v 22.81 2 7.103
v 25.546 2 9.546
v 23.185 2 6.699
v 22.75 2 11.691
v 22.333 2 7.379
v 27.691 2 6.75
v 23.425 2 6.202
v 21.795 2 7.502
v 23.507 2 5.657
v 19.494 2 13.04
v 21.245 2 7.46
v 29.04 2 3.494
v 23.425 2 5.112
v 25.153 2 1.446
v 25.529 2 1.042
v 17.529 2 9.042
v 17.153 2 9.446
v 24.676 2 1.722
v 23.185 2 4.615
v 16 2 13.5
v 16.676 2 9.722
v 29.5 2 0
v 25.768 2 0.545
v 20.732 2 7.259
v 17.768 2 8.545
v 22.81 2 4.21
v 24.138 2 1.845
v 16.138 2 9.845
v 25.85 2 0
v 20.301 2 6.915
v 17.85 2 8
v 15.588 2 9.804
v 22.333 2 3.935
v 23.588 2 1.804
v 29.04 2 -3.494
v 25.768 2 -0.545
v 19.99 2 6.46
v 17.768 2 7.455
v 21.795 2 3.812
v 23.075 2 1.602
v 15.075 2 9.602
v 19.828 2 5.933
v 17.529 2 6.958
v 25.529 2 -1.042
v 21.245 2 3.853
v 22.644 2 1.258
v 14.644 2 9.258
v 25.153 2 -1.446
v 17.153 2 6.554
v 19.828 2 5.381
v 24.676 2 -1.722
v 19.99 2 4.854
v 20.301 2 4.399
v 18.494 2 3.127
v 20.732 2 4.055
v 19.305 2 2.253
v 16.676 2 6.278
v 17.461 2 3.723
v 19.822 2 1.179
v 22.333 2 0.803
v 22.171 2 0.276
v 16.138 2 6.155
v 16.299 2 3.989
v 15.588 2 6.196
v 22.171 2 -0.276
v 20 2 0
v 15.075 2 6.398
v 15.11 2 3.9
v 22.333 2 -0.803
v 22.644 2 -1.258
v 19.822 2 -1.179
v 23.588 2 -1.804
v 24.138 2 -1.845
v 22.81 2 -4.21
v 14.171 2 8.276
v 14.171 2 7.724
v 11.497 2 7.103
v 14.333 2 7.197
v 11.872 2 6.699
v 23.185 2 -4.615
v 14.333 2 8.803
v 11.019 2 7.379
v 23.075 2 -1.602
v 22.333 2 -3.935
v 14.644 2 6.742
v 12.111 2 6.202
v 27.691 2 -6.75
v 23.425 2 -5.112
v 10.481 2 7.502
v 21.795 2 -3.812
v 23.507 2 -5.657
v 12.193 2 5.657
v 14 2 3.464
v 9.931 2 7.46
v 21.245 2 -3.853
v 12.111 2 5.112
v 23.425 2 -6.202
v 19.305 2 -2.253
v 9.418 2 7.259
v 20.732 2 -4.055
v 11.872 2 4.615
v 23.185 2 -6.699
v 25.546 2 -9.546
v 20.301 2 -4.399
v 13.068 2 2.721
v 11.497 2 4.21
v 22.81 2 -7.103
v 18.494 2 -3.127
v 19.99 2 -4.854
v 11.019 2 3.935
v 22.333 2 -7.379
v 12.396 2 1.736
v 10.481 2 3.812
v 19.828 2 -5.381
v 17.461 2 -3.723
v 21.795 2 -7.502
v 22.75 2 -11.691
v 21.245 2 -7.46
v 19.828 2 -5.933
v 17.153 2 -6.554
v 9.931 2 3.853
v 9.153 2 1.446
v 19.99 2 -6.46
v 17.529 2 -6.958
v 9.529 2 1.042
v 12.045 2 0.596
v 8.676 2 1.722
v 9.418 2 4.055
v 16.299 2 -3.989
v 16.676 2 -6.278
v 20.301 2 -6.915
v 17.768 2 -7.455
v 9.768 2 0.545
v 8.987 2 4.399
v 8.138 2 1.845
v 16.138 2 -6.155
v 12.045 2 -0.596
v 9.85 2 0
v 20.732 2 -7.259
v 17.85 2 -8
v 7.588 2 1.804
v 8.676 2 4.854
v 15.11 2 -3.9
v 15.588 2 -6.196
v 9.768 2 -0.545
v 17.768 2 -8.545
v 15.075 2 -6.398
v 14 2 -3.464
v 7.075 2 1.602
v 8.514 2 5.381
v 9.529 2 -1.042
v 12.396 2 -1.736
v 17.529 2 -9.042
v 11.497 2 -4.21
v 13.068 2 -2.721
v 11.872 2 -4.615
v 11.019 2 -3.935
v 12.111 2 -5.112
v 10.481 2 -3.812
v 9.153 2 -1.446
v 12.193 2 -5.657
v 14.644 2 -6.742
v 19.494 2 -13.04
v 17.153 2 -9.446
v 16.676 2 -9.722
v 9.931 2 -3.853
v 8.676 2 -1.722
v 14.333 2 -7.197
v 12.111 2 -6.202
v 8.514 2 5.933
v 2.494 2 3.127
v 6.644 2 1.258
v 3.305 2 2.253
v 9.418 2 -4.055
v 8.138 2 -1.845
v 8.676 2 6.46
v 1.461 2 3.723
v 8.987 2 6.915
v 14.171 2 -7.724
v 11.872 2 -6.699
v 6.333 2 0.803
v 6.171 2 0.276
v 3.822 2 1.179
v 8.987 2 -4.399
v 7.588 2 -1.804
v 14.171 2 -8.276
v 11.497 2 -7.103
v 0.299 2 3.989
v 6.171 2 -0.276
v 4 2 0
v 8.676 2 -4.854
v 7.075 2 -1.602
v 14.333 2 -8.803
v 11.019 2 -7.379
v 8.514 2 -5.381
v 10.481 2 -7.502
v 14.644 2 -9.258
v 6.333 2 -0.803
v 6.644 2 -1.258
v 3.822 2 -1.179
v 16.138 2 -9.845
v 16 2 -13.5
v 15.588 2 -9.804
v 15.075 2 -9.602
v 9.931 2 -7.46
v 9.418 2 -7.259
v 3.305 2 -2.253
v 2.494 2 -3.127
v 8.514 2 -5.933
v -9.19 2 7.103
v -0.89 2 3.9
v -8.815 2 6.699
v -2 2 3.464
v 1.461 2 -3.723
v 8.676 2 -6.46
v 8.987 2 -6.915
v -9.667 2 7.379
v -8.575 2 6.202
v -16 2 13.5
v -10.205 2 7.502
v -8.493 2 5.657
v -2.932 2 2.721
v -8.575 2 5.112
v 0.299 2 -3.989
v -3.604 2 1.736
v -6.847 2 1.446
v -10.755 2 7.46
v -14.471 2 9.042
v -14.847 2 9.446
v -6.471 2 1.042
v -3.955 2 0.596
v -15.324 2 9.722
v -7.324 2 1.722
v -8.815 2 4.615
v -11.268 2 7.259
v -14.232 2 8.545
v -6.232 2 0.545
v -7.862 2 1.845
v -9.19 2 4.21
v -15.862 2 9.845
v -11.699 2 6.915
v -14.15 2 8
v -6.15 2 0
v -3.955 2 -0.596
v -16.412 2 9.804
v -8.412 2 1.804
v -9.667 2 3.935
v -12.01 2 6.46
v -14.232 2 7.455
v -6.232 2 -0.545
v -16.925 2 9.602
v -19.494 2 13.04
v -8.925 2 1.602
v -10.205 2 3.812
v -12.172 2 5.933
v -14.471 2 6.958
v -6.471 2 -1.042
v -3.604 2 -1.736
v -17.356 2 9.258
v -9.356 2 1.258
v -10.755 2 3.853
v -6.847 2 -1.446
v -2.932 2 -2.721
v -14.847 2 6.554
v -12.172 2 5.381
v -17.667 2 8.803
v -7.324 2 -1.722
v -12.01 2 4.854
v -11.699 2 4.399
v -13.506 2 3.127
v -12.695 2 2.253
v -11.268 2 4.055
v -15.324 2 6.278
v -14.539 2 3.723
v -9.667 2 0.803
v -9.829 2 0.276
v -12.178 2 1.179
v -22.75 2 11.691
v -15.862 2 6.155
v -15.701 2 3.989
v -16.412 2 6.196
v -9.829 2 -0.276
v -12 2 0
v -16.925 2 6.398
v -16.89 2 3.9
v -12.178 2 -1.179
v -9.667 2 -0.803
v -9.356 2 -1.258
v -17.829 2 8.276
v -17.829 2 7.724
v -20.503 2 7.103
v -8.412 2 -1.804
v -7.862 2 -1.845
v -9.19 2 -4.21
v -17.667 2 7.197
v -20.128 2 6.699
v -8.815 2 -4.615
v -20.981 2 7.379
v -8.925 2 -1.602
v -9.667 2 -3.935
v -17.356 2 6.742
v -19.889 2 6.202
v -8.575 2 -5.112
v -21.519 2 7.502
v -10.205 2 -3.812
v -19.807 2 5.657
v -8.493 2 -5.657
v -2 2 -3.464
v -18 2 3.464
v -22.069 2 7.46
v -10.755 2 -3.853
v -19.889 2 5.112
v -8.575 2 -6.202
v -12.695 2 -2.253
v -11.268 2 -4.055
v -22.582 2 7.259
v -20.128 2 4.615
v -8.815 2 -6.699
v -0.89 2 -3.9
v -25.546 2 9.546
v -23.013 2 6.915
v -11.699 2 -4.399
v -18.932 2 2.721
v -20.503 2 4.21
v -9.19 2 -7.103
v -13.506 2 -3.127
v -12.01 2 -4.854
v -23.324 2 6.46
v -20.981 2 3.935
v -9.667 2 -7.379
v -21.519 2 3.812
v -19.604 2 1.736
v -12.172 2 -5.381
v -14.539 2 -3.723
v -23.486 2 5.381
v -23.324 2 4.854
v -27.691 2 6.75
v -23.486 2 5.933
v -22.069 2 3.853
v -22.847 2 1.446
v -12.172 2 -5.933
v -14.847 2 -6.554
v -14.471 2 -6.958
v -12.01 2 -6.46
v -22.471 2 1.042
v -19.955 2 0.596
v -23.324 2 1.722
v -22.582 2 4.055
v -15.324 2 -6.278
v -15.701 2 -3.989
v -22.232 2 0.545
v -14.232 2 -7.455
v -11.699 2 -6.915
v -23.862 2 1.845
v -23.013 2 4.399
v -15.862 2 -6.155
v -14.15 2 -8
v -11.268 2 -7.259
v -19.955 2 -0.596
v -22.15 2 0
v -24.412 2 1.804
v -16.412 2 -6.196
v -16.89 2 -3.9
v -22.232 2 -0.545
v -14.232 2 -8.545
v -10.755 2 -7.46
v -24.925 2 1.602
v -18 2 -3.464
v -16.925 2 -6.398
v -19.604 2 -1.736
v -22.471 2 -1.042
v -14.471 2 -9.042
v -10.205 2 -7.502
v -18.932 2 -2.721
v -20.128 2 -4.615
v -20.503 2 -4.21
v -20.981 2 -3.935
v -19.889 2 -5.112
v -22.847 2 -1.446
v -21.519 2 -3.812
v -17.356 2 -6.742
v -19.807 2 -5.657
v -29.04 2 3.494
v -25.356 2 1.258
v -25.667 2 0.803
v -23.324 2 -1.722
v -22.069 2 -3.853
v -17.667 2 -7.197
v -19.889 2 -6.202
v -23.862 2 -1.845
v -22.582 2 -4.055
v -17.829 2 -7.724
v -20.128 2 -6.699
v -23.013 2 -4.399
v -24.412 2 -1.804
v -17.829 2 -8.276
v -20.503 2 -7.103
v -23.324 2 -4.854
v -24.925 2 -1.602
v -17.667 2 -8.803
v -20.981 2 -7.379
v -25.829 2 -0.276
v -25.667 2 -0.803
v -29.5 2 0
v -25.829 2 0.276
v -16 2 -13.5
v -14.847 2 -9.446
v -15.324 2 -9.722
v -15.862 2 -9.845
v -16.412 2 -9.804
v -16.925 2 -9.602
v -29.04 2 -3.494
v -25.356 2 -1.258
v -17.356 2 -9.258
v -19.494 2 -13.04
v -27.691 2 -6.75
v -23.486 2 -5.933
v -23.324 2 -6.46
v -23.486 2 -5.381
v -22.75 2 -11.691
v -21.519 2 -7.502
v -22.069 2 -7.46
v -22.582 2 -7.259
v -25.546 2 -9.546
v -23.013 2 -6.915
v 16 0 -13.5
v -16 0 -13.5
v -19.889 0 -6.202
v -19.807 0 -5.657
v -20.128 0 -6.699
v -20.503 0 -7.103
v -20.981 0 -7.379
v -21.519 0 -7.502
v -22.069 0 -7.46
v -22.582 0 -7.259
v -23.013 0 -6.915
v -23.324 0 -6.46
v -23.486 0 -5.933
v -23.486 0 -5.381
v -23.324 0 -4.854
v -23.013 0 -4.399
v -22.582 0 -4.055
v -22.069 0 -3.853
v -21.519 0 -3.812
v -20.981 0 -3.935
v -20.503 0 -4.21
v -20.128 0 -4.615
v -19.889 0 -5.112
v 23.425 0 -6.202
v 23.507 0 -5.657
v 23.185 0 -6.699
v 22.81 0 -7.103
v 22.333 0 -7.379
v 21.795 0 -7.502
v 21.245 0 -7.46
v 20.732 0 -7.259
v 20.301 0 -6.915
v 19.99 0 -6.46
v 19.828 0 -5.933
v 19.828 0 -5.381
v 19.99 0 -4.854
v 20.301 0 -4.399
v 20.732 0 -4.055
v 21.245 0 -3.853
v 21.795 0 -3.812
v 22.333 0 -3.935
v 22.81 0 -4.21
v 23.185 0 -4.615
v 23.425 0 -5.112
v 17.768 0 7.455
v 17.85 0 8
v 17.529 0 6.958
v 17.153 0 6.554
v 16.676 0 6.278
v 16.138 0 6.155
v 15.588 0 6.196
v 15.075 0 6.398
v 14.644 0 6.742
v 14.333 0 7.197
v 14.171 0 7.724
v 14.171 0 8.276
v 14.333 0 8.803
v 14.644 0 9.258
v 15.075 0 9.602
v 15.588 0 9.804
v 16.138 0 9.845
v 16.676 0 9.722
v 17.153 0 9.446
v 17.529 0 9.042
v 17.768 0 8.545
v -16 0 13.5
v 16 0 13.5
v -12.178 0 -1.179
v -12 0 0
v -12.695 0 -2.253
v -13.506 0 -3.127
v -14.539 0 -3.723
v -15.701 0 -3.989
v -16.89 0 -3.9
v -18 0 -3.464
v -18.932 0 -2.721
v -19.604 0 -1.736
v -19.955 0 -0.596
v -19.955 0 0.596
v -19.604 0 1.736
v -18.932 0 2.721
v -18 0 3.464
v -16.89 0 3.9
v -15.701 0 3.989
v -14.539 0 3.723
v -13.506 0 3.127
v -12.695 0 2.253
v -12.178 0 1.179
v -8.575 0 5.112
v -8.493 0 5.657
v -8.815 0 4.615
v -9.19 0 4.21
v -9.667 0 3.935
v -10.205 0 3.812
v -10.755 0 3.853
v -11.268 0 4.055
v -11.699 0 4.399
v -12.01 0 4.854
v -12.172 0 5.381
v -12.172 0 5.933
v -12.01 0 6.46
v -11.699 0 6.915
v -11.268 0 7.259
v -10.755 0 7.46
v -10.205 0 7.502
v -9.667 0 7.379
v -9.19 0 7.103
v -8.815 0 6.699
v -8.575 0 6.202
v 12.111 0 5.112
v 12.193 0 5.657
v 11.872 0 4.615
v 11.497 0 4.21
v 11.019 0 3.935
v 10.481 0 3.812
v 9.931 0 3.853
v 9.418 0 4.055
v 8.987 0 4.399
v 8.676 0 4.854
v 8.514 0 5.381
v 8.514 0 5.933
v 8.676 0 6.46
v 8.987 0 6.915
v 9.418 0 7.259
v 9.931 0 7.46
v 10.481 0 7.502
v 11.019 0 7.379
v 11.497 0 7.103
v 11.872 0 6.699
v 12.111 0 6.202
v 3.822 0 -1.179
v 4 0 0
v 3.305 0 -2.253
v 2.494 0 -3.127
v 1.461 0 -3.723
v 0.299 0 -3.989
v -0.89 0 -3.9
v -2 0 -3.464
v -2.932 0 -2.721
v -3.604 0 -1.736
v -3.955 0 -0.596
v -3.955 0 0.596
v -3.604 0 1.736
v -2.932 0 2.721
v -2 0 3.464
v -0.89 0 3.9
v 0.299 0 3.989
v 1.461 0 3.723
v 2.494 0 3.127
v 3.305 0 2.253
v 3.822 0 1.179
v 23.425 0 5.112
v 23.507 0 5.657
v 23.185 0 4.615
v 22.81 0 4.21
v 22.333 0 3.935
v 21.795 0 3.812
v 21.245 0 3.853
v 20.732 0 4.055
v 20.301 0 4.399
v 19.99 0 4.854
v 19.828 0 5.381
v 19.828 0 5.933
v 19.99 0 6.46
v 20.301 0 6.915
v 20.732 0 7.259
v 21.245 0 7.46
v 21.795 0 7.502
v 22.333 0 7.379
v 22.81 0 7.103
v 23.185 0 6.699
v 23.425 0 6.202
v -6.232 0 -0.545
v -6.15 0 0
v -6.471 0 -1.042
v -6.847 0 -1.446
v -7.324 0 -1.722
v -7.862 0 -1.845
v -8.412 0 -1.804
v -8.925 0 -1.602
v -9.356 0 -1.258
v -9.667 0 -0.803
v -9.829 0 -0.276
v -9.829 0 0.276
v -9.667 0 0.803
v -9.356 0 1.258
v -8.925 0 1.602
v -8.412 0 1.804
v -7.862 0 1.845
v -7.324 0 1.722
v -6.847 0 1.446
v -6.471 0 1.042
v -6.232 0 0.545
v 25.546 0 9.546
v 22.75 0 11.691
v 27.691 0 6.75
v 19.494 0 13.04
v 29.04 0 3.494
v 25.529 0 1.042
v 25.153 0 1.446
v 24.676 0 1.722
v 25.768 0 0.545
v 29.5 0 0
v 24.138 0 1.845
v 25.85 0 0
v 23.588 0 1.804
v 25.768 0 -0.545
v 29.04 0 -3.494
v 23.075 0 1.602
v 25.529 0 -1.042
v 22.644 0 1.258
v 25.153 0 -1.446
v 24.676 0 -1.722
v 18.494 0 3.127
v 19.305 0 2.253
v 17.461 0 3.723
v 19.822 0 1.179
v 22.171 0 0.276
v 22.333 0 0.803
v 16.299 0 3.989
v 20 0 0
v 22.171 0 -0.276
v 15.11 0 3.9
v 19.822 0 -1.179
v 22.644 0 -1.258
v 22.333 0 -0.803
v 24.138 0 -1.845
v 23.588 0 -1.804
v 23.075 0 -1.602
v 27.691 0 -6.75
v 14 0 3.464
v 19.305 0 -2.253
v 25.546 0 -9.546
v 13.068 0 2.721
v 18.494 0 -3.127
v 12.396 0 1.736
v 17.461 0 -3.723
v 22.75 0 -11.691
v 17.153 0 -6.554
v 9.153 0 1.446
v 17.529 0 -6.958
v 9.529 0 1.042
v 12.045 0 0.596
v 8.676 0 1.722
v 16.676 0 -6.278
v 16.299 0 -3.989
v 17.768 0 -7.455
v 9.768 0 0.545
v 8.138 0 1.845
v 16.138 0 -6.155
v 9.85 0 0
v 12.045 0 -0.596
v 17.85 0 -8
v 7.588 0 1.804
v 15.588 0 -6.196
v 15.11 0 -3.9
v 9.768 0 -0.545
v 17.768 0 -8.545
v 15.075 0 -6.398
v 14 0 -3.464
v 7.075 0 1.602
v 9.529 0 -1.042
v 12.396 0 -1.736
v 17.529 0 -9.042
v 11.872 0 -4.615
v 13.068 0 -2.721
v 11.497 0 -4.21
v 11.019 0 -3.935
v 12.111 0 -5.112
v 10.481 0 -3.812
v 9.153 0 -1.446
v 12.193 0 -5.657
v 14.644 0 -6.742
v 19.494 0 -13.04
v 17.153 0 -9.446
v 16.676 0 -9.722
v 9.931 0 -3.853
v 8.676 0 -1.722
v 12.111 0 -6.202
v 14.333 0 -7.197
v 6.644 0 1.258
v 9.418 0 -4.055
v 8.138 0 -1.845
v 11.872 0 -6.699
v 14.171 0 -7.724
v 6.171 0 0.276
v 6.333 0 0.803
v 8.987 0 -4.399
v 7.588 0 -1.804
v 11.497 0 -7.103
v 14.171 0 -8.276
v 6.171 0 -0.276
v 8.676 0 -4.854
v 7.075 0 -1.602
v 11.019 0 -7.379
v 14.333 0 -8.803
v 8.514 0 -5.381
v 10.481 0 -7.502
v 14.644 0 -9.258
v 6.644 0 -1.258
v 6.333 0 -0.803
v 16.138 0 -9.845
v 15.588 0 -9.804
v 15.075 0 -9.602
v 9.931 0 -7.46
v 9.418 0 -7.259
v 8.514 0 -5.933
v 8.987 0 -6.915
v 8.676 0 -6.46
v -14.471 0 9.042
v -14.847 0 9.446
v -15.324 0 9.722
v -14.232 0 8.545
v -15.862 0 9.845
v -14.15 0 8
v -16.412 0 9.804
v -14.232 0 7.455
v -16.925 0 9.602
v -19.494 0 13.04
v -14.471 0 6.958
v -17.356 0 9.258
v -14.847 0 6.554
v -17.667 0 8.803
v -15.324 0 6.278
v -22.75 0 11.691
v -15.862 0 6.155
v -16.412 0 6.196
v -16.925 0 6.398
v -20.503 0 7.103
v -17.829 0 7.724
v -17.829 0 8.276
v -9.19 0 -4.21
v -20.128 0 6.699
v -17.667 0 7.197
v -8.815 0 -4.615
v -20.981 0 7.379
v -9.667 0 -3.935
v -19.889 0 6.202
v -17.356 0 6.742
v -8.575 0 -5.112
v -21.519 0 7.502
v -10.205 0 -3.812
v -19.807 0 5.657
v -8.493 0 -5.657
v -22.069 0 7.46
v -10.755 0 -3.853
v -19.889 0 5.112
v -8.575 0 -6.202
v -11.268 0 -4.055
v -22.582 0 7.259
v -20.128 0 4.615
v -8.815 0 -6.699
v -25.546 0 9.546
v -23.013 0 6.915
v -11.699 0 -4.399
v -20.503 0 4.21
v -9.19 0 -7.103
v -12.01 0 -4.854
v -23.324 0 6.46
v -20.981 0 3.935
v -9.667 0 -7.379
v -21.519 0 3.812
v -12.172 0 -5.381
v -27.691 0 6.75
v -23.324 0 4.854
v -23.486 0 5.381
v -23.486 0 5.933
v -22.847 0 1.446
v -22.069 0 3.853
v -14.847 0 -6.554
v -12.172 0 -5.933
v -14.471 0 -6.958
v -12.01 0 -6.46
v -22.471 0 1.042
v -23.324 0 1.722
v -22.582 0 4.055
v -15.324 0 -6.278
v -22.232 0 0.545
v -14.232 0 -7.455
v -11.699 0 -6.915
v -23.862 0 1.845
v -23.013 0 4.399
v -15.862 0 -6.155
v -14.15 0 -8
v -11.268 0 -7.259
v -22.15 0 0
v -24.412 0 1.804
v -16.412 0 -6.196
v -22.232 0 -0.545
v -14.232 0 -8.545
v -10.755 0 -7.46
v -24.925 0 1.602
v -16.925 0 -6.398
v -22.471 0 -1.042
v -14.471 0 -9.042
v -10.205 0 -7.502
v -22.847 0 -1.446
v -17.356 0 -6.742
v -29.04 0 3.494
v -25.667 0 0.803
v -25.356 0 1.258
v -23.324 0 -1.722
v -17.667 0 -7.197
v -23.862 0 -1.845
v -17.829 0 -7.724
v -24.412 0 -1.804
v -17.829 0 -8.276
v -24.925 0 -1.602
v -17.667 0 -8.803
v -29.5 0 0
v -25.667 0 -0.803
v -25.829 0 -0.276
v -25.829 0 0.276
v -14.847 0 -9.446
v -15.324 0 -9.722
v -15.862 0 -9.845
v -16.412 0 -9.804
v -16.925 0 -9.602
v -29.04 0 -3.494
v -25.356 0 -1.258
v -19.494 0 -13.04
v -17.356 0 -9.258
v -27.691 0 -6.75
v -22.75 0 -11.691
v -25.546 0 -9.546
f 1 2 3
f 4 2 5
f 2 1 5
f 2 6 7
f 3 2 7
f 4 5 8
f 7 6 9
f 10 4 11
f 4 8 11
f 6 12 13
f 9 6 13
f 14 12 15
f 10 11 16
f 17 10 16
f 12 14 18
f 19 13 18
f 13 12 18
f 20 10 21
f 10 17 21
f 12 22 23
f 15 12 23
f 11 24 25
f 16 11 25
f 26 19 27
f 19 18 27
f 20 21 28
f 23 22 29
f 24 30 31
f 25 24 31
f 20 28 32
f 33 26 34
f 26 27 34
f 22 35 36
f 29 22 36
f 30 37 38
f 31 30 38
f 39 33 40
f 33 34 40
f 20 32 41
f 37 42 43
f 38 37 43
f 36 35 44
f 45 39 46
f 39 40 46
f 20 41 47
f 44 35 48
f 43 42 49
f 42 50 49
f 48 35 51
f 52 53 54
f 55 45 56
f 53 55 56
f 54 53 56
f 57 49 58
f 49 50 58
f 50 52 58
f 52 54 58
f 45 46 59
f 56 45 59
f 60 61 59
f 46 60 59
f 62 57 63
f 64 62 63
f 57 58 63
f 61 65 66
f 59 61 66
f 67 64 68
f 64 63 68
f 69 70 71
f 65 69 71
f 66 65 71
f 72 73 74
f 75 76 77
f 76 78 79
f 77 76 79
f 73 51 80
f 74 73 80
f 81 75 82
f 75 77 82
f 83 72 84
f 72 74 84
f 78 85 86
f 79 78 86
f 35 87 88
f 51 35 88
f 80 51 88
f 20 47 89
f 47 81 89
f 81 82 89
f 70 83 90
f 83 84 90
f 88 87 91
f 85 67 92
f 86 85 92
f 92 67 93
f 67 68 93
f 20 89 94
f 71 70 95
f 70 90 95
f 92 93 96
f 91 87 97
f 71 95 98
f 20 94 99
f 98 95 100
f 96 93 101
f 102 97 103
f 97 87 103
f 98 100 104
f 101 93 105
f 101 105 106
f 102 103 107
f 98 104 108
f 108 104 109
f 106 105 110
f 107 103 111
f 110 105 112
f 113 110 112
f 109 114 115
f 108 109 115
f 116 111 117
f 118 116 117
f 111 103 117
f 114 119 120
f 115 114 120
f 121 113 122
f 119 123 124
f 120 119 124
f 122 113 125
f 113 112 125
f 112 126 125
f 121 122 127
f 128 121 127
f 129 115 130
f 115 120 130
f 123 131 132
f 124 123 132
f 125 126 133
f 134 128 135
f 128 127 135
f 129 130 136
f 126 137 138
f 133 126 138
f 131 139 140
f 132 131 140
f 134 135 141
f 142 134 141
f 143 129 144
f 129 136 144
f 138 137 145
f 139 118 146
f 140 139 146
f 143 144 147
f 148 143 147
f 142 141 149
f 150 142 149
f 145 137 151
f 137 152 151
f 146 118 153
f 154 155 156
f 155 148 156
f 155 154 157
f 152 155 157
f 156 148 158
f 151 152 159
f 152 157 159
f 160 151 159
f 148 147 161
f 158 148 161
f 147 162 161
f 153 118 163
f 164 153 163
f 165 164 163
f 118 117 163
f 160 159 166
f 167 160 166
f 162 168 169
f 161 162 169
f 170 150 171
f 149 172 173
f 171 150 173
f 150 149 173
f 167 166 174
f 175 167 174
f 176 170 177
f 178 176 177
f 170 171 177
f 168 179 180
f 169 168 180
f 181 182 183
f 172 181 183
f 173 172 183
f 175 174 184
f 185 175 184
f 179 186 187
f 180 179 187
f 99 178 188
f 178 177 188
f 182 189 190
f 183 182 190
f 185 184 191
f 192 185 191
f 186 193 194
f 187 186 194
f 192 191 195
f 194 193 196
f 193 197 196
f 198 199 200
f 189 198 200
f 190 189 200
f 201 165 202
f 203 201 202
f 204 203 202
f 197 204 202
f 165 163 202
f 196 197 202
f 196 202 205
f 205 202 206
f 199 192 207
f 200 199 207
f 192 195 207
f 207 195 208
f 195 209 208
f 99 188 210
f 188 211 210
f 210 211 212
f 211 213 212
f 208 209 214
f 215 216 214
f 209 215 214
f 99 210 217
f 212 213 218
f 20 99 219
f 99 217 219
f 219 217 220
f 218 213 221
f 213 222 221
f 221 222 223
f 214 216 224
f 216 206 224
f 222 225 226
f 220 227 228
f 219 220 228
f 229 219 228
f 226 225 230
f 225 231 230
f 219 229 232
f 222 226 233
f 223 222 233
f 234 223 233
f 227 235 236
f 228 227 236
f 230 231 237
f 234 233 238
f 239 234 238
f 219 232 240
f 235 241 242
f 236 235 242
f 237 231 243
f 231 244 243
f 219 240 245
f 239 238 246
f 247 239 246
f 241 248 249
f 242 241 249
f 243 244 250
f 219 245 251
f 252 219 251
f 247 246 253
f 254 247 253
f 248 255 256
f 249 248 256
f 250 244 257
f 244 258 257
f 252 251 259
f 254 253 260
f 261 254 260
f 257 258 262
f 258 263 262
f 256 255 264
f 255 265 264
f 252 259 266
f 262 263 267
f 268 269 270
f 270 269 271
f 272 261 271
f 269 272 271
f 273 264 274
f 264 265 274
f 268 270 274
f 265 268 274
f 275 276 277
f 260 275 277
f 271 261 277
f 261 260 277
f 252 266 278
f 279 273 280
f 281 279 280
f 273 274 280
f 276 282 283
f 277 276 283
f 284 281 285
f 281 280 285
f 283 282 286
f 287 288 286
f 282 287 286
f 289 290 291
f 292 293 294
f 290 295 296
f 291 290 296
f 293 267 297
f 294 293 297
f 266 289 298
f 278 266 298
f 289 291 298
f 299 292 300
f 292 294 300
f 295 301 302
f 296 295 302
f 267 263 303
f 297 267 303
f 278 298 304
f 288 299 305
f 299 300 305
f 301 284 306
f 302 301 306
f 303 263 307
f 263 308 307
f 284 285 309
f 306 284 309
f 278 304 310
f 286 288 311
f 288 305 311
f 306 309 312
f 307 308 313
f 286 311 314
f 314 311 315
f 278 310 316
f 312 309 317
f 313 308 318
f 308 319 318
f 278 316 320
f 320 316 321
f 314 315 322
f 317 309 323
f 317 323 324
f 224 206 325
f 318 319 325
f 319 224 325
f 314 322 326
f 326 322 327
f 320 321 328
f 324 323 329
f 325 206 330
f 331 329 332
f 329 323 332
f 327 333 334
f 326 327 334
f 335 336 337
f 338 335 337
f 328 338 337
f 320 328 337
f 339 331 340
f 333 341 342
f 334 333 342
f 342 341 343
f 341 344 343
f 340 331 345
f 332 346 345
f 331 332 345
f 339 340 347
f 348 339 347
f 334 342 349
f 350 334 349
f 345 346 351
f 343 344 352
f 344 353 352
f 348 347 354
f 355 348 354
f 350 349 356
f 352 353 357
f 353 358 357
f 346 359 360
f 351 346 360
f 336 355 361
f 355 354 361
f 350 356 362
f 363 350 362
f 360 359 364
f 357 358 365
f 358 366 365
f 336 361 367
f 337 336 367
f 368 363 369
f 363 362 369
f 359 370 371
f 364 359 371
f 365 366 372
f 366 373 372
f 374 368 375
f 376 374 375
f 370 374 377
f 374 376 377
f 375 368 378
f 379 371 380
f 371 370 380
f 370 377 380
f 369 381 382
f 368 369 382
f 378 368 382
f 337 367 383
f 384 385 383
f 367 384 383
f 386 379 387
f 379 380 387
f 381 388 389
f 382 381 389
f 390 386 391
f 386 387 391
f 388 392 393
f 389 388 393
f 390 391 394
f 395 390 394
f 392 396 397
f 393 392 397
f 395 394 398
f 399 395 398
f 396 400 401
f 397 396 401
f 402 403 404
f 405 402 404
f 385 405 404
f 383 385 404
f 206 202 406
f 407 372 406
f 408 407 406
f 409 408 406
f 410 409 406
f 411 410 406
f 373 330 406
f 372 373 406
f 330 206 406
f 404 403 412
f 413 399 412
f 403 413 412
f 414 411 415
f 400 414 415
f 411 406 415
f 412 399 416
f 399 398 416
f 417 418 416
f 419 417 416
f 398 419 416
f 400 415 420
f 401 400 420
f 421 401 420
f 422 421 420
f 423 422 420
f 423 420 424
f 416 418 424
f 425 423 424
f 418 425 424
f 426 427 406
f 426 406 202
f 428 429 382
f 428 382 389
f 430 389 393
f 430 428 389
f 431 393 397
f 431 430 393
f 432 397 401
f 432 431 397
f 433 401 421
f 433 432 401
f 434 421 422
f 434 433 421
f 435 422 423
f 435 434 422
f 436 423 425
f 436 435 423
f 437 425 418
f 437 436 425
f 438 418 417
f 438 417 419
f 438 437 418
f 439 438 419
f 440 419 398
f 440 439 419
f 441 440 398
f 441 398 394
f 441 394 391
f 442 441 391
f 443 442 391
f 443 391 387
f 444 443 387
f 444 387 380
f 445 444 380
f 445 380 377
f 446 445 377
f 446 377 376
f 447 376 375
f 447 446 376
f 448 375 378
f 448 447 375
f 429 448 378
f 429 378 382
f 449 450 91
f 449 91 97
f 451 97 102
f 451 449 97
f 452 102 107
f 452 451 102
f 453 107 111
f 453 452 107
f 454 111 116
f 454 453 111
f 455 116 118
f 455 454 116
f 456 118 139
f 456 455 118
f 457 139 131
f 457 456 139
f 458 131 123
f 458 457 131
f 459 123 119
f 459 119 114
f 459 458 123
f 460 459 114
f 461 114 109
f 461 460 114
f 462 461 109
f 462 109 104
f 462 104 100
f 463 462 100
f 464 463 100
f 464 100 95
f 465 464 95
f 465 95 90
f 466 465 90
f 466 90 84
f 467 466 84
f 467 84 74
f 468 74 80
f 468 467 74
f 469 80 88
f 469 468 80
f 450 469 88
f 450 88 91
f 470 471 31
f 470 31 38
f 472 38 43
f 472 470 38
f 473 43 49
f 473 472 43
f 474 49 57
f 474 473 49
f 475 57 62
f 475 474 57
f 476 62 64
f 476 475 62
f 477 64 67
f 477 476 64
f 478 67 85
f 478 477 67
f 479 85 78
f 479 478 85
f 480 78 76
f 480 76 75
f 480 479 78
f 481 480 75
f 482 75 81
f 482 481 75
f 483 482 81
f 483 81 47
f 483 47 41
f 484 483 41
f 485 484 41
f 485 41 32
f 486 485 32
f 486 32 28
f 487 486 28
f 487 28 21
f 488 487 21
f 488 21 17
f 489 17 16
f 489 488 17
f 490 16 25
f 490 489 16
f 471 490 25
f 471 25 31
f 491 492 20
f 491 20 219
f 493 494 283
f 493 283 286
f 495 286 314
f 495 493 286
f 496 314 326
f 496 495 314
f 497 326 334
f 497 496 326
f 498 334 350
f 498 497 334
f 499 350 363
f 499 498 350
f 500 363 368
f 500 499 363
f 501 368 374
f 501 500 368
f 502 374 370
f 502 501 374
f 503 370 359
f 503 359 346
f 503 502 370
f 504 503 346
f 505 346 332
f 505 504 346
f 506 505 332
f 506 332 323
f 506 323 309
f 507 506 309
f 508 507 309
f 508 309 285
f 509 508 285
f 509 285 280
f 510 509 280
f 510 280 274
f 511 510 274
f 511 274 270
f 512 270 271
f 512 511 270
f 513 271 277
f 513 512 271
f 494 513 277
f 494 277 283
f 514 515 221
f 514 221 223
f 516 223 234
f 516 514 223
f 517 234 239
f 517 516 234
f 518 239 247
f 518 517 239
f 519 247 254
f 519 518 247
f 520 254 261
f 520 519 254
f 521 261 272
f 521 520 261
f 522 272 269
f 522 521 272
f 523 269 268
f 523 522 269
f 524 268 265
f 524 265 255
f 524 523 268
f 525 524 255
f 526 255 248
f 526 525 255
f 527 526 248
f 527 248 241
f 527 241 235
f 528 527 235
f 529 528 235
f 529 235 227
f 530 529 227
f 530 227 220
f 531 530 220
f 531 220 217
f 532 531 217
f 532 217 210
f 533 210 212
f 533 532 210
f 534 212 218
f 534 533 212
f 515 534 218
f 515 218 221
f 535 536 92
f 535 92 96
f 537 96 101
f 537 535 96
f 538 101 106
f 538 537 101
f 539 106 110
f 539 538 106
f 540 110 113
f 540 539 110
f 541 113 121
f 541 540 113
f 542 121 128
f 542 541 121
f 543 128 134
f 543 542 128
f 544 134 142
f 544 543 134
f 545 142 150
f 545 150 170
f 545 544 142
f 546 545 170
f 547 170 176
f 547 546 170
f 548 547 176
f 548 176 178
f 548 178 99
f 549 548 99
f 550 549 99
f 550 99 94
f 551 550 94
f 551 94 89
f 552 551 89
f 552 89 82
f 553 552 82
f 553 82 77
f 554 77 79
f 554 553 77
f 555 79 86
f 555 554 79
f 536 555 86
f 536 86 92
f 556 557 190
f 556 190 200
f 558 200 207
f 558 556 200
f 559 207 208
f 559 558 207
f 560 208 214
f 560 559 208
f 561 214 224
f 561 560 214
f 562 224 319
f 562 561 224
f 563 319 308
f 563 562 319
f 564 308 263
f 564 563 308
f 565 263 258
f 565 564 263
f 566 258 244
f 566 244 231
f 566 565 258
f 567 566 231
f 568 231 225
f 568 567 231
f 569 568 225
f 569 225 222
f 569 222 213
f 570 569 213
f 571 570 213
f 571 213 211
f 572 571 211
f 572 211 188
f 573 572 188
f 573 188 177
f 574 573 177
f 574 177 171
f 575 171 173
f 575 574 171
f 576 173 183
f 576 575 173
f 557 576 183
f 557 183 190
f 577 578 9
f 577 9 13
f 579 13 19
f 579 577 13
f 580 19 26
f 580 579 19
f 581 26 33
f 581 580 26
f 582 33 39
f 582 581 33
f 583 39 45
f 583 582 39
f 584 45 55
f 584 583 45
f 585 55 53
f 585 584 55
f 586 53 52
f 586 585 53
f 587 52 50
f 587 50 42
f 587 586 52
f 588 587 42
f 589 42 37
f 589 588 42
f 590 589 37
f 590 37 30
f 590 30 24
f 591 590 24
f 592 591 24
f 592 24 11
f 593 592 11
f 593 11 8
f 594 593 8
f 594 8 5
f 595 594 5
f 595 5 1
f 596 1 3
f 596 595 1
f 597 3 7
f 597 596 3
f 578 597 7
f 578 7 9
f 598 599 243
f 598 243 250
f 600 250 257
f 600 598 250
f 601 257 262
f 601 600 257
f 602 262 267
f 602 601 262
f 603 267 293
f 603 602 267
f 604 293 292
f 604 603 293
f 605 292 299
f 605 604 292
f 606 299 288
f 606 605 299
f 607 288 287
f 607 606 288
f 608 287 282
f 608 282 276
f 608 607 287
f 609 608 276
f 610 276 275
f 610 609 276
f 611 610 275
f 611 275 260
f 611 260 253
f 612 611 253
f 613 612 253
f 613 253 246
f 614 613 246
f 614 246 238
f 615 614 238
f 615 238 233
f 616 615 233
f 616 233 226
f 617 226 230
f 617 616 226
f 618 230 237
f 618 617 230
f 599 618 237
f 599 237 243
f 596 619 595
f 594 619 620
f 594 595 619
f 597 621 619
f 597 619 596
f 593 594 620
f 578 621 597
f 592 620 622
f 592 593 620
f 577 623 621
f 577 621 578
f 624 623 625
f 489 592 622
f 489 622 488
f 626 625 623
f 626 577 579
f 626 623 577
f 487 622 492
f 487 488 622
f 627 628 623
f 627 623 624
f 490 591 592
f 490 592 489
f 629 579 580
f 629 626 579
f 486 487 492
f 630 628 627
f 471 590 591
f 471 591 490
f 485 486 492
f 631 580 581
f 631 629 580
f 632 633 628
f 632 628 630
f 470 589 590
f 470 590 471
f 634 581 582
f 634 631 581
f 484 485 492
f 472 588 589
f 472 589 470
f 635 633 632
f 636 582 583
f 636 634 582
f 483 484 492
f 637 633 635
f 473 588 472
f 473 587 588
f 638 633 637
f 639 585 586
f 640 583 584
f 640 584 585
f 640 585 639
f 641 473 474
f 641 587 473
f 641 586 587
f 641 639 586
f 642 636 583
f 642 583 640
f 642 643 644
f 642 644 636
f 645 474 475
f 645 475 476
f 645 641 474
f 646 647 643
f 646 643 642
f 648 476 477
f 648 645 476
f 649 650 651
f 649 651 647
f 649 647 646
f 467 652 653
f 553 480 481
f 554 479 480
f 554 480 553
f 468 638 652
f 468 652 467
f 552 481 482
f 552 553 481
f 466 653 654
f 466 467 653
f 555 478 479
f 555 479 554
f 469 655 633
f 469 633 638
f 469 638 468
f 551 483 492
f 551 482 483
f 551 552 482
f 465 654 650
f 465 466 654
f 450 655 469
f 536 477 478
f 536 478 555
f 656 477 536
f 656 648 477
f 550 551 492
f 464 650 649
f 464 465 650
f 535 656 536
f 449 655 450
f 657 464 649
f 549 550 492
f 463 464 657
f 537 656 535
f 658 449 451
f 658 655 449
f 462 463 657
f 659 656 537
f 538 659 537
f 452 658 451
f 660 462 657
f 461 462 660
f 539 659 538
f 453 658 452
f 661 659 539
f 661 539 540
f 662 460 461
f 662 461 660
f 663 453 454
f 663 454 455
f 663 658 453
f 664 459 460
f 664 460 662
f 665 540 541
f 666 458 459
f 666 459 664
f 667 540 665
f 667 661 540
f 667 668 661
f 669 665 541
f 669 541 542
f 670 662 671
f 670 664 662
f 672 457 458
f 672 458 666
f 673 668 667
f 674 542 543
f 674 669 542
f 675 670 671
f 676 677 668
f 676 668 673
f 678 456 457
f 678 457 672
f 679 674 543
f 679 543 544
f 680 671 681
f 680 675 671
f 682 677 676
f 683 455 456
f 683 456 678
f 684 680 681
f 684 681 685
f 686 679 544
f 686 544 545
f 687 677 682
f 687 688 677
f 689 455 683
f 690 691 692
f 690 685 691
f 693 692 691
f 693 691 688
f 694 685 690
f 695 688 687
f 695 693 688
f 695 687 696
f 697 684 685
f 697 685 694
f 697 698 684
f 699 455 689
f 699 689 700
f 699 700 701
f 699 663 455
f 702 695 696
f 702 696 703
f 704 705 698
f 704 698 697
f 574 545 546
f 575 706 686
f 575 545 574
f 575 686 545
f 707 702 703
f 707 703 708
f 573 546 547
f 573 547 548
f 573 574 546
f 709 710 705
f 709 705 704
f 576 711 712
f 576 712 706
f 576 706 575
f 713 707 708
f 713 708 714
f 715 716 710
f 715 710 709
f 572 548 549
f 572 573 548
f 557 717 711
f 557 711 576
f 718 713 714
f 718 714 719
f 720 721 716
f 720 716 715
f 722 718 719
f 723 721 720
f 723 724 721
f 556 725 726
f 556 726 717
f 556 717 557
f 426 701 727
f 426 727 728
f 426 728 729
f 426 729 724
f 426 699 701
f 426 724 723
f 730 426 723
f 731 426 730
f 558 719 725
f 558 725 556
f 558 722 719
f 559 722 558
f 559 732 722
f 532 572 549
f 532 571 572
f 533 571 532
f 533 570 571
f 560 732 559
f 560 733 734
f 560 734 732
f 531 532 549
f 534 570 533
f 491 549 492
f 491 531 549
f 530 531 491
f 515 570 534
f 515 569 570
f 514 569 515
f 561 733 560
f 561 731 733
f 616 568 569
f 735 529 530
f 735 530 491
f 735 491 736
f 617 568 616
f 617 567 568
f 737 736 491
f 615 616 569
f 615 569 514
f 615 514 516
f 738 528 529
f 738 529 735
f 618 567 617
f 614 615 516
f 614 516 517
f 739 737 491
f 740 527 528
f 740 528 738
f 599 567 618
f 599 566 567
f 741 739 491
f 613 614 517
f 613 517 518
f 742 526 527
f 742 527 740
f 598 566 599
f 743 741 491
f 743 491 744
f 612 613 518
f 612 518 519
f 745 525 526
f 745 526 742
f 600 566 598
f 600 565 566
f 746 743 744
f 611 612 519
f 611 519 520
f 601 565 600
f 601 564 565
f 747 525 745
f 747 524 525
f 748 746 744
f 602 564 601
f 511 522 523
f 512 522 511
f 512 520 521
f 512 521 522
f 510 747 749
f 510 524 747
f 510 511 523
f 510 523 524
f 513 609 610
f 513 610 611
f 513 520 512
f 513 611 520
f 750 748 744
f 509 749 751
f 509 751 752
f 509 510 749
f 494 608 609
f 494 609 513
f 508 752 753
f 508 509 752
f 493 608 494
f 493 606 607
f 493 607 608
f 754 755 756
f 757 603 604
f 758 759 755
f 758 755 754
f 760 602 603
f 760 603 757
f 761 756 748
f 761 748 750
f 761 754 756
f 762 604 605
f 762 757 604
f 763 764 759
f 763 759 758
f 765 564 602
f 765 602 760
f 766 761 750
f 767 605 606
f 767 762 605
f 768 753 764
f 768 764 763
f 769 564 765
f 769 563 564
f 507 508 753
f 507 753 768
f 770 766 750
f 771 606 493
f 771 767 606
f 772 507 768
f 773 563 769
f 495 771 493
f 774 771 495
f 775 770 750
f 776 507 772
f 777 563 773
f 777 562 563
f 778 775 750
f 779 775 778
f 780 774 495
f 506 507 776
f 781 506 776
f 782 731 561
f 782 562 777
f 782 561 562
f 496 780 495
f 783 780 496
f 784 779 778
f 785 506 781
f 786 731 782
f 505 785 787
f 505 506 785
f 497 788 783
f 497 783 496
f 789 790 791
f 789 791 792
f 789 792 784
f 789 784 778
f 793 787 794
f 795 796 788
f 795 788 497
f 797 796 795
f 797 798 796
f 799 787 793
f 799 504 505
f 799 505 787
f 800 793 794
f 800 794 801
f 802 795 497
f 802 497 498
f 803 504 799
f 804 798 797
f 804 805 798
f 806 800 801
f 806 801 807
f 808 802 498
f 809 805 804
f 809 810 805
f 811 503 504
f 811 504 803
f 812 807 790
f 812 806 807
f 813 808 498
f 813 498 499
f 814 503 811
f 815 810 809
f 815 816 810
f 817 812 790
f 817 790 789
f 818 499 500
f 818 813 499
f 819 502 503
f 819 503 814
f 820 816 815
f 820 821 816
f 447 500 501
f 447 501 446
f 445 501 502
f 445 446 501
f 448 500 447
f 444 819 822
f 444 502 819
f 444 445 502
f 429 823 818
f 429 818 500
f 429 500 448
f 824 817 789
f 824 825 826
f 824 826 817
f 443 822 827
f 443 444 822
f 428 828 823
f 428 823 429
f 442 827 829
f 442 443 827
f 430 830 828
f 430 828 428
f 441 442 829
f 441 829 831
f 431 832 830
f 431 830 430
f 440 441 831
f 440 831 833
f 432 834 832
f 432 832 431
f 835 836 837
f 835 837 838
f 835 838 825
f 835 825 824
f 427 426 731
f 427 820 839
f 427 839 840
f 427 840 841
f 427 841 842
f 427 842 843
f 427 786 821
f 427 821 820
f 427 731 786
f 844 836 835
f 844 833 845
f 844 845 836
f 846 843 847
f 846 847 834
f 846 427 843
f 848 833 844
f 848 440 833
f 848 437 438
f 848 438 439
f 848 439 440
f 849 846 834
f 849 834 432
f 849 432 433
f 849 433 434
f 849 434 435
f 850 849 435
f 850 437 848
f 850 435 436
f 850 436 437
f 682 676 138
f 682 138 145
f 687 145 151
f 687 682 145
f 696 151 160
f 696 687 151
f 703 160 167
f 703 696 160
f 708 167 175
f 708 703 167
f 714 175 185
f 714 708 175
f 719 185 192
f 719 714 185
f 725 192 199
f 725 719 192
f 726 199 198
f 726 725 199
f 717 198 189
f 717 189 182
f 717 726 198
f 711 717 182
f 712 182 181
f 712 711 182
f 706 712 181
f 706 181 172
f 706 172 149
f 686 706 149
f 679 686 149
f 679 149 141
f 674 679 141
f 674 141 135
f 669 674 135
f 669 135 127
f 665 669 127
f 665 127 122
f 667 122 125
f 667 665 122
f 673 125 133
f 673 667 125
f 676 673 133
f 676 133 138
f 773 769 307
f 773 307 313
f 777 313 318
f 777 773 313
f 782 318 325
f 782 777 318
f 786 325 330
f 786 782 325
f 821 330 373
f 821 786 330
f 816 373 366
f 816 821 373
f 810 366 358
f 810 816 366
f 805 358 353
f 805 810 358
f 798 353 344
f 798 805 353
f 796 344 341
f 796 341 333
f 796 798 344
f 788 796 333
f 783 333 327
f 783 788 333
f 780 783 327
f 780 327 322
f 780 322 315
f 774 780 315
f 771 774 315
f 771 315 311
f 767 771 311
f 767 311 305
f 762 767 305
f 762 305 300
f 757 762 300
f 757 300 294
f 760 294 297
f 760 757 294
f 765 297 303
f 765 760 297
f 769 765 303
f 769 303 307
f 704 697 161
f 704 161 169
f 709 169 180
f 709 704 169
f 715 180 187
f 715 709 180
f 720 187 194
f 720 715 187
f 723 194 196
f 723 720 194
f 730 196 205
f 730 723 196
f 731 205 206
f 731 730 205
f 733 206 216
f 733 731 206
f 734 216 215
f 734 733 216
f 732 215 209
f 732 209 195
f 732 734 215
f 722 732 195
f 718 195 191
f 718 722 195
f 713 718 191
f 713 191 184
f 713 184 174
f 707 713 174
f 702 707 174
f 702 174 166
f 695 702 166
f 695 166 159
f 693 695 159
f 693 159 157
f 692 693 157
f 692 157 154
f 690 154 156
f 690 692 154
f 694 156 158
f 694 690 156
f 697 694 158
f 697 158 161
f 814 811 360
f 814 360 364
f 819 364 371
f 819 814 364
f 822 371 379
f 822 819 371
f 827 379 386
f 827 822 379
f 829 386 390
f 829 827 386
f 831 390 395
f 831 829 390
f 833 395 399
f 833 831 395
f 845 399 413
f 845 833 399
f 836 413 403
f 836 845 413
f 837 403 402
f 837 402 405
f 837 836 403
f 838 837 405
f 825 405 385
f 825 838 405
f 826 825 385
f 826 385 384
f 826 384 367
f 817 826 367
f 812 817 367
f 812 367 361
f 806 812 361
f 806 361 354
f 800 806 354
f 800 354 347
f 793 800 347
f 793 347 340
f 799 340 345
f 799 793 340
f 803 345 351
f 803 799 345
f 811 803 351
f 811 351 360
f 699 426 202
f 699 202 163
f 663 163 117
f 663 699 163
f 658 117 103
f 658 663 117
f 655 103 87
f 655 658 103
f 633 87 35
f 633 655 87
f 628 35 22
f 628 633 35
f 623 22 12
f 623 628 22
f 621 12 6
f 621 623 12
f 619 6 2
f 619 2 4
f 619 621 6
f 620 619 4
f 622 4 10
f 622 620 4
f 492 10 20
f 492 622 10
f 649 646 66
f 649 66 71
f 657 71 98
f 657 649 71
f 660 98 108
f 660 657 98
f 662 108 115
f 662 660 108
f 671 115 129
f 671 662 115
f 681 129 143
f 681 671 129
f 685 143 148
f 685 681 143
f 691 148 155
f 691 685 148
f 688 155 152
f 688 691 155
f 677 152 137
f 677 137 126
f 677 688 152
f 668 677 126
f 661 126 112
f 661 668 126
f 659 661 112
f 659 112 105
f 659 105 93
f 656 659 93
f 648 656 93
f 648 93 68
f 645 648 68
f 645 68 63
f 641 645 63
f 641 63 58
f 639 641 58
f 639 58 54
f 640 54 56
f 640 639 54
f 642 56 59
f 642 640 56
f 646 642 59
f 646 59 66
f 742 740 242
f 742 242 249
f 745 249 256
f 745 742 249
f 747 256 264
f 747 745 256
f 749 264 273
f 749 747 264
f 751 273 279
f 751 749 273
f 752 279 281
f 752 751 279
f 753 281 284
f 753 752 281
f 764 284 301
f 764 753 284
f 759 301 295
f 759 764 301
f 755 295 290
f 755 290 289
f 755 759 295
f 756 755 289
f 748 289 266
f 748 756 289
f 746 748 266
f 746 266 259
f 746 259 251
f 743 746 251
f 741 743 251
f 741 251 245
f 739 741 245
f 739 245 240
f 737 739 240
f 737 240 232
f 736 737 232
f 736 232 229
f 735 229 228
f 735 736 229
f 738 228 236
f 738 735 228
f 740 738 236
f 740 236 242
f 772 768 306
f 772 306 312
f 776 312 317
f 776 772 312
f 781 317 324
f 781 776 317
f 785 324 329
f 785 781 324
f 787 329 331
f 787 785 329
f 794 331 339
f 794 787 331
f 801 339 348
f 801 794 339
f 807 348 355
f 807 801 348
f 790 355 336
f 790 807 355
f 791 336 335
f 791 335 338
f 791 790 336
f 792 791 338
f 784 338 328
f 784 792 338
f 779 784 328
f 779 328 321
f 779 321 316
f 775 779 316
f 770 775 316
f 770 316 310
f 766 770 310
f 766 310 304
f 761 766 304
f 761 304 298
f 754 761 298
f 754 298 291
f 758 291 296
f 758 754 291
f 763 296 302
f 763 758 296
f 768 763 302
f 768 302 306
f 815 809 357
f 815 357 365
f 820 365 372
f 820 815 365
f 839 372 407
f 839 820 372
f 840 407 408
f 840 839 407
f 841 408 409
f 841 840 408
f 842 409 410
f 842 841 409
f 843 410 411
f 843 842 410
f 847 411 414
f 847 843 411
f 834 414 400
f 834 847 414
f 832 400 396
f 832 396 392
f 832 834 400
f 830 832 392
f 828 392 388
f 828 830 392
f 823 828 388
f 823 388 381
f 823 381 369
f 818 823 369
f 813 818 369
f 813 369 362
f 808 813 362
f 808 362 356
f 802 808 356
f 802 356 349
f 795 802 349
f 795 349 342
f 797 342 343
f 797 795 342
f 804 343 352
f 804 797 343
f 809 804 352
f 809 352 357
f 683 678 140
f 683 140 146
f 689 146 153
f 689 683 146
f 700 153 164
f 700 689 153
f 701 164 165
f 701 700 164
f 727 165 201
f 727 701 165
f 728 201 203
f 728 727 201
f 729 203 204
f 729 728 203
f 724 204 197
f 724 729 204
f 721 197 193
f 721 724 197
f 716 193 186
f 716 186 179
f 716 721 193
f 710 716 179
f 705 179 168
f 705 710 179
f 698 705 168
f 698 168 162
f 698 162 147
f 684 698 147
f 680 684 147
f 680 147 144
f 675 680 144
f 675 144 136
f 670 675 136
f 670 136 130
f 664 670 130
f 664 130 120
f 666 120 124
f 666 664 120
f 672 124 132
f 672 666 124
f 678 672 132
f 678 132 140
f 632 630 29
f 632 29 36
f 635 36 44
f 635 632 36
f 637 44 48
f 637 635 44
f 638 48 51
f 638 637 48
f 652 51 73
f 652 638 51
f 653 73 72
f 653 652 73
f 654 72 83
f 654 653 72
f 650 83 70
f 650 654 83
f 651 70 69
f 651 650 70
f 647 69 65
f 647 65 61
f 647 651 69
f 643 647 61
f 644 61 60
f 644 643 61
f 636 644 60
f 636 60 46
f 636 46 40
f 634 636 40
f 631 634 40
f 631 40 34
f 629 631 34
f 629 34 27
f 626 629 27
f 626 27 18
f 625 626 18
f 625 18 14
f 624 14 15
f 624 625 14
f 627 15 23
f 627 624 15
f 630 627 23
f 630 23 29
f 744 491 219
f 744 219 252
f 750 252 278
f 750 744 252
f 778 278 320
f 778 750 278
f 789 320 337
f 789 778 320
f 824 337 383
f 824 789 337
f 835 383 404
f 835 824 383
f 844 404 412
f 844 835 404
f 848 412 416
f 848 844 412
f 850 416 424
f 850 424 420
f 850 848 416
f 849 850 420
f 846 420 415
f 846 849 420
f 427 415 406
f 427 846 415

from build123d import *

# Parameters (mm, degrees)
SKETCH1_R           = 4
SKETCH1_R_2         = 1.85
BOSS_EXTRUDE1_DEPTH = 2


with BuildPart() as part:
    # Sketch1 → Boss-Extrude1 (new body)
    with BuildSketch(Plane(origin=(0, 0, 0), x_dir=(1, 0, 0), z_dir=(0, 1, 0))):
        with BuildLine():
            Line((-16, 13.5), (16, 13.5))
            ThreePointArc((16, 13.5), (29.5, 0), (16, -13.5))
            Line((16, -13.5), (-16, -13.5))
            ThreePointArc((-16, -13.5), (-29.5, 0), (-16, 13.5))
        make_face()
        Circle(SKETCH1_R, mode=Mode.SUBTRACT)
        with Locations((16, 0)):
            Circle(SKETCH1_R, mode=Mode.SUBTRACT)
        with Locations((8, 0)):
            Circle(SKETCH1_R_2, mode=Mode.SUBTRACT)
        with Locations((10.343145751, 5.656854249)):
            Circle(SKETCH1_R_2, mode=Mode.SUBTRACT)
        with Locations((16, 8)):
            Circle(SKETCH1_R_2, mode=Mode.SUBTRACT)
        with Locations((21.656854249, 5.656854249)):
            Circle(SKETCH1_R_2, mode=Mode.SUBTRACT)
        with Locations((24, 0)):
            Circle(SKETCH1_R_2, mode=Mode.SUBTRACT)
        with Locations((21.656854249, -5.656854249)):
            Circle(SKETCH1_R_2, mode=Mode.SUBTRACT)
        with Locations((16, -8)):
            Circle(SKETCH1_R_2, mode=Mode.SUBTRACT)
        with Locations((10.343145751, -5.656854249)):
            Circle(SKETCH1_R_2, mode=Mode.SUBTRACT)
        with Locations((-10.343145751, -5.656854249)):
            Circle(SKETCH1_R_2, mode=Mode.SUBTRACT)
        with Locations((-16, -8)):
            Circle(SKETCH1_R_2, mode=Mode.SUBTRACT)
        with Locations((-21.656854249, -5.656854249)):
            Circle(SKETCH1_R_2, mode=Mode.SUBTRACT)
        with Locations((-24, 0)):
            Circle(SKETCH1_R_2, mode=Mode.SUBTRACT)
        with Locations((-21.656854249, 5.656854249)):
            Circle(SKETCH1_R_2, mode=Mode.SUBTRACT)
        with Locations((-16, 8)):
            Circle(SKETCH1_R_2, mode=Mode.SUBTRACT)
        with Locations((-10.343145751, 5.656854249)):
            Circle(SKETCH1_R_2, mode=Mode.SUBTRACT)
        with Locations((-8, 0)):
            Circle(SKETCH1_R_2, mode=Mode.SUBTRACT)
        with Locations((-16, 0)):
            Circle(SKETCH1_R, mode=Mode.SUBTRACT)
    extrude(amount=BOSS_EXTRUDE1_DEPTH)


solid = part.part
